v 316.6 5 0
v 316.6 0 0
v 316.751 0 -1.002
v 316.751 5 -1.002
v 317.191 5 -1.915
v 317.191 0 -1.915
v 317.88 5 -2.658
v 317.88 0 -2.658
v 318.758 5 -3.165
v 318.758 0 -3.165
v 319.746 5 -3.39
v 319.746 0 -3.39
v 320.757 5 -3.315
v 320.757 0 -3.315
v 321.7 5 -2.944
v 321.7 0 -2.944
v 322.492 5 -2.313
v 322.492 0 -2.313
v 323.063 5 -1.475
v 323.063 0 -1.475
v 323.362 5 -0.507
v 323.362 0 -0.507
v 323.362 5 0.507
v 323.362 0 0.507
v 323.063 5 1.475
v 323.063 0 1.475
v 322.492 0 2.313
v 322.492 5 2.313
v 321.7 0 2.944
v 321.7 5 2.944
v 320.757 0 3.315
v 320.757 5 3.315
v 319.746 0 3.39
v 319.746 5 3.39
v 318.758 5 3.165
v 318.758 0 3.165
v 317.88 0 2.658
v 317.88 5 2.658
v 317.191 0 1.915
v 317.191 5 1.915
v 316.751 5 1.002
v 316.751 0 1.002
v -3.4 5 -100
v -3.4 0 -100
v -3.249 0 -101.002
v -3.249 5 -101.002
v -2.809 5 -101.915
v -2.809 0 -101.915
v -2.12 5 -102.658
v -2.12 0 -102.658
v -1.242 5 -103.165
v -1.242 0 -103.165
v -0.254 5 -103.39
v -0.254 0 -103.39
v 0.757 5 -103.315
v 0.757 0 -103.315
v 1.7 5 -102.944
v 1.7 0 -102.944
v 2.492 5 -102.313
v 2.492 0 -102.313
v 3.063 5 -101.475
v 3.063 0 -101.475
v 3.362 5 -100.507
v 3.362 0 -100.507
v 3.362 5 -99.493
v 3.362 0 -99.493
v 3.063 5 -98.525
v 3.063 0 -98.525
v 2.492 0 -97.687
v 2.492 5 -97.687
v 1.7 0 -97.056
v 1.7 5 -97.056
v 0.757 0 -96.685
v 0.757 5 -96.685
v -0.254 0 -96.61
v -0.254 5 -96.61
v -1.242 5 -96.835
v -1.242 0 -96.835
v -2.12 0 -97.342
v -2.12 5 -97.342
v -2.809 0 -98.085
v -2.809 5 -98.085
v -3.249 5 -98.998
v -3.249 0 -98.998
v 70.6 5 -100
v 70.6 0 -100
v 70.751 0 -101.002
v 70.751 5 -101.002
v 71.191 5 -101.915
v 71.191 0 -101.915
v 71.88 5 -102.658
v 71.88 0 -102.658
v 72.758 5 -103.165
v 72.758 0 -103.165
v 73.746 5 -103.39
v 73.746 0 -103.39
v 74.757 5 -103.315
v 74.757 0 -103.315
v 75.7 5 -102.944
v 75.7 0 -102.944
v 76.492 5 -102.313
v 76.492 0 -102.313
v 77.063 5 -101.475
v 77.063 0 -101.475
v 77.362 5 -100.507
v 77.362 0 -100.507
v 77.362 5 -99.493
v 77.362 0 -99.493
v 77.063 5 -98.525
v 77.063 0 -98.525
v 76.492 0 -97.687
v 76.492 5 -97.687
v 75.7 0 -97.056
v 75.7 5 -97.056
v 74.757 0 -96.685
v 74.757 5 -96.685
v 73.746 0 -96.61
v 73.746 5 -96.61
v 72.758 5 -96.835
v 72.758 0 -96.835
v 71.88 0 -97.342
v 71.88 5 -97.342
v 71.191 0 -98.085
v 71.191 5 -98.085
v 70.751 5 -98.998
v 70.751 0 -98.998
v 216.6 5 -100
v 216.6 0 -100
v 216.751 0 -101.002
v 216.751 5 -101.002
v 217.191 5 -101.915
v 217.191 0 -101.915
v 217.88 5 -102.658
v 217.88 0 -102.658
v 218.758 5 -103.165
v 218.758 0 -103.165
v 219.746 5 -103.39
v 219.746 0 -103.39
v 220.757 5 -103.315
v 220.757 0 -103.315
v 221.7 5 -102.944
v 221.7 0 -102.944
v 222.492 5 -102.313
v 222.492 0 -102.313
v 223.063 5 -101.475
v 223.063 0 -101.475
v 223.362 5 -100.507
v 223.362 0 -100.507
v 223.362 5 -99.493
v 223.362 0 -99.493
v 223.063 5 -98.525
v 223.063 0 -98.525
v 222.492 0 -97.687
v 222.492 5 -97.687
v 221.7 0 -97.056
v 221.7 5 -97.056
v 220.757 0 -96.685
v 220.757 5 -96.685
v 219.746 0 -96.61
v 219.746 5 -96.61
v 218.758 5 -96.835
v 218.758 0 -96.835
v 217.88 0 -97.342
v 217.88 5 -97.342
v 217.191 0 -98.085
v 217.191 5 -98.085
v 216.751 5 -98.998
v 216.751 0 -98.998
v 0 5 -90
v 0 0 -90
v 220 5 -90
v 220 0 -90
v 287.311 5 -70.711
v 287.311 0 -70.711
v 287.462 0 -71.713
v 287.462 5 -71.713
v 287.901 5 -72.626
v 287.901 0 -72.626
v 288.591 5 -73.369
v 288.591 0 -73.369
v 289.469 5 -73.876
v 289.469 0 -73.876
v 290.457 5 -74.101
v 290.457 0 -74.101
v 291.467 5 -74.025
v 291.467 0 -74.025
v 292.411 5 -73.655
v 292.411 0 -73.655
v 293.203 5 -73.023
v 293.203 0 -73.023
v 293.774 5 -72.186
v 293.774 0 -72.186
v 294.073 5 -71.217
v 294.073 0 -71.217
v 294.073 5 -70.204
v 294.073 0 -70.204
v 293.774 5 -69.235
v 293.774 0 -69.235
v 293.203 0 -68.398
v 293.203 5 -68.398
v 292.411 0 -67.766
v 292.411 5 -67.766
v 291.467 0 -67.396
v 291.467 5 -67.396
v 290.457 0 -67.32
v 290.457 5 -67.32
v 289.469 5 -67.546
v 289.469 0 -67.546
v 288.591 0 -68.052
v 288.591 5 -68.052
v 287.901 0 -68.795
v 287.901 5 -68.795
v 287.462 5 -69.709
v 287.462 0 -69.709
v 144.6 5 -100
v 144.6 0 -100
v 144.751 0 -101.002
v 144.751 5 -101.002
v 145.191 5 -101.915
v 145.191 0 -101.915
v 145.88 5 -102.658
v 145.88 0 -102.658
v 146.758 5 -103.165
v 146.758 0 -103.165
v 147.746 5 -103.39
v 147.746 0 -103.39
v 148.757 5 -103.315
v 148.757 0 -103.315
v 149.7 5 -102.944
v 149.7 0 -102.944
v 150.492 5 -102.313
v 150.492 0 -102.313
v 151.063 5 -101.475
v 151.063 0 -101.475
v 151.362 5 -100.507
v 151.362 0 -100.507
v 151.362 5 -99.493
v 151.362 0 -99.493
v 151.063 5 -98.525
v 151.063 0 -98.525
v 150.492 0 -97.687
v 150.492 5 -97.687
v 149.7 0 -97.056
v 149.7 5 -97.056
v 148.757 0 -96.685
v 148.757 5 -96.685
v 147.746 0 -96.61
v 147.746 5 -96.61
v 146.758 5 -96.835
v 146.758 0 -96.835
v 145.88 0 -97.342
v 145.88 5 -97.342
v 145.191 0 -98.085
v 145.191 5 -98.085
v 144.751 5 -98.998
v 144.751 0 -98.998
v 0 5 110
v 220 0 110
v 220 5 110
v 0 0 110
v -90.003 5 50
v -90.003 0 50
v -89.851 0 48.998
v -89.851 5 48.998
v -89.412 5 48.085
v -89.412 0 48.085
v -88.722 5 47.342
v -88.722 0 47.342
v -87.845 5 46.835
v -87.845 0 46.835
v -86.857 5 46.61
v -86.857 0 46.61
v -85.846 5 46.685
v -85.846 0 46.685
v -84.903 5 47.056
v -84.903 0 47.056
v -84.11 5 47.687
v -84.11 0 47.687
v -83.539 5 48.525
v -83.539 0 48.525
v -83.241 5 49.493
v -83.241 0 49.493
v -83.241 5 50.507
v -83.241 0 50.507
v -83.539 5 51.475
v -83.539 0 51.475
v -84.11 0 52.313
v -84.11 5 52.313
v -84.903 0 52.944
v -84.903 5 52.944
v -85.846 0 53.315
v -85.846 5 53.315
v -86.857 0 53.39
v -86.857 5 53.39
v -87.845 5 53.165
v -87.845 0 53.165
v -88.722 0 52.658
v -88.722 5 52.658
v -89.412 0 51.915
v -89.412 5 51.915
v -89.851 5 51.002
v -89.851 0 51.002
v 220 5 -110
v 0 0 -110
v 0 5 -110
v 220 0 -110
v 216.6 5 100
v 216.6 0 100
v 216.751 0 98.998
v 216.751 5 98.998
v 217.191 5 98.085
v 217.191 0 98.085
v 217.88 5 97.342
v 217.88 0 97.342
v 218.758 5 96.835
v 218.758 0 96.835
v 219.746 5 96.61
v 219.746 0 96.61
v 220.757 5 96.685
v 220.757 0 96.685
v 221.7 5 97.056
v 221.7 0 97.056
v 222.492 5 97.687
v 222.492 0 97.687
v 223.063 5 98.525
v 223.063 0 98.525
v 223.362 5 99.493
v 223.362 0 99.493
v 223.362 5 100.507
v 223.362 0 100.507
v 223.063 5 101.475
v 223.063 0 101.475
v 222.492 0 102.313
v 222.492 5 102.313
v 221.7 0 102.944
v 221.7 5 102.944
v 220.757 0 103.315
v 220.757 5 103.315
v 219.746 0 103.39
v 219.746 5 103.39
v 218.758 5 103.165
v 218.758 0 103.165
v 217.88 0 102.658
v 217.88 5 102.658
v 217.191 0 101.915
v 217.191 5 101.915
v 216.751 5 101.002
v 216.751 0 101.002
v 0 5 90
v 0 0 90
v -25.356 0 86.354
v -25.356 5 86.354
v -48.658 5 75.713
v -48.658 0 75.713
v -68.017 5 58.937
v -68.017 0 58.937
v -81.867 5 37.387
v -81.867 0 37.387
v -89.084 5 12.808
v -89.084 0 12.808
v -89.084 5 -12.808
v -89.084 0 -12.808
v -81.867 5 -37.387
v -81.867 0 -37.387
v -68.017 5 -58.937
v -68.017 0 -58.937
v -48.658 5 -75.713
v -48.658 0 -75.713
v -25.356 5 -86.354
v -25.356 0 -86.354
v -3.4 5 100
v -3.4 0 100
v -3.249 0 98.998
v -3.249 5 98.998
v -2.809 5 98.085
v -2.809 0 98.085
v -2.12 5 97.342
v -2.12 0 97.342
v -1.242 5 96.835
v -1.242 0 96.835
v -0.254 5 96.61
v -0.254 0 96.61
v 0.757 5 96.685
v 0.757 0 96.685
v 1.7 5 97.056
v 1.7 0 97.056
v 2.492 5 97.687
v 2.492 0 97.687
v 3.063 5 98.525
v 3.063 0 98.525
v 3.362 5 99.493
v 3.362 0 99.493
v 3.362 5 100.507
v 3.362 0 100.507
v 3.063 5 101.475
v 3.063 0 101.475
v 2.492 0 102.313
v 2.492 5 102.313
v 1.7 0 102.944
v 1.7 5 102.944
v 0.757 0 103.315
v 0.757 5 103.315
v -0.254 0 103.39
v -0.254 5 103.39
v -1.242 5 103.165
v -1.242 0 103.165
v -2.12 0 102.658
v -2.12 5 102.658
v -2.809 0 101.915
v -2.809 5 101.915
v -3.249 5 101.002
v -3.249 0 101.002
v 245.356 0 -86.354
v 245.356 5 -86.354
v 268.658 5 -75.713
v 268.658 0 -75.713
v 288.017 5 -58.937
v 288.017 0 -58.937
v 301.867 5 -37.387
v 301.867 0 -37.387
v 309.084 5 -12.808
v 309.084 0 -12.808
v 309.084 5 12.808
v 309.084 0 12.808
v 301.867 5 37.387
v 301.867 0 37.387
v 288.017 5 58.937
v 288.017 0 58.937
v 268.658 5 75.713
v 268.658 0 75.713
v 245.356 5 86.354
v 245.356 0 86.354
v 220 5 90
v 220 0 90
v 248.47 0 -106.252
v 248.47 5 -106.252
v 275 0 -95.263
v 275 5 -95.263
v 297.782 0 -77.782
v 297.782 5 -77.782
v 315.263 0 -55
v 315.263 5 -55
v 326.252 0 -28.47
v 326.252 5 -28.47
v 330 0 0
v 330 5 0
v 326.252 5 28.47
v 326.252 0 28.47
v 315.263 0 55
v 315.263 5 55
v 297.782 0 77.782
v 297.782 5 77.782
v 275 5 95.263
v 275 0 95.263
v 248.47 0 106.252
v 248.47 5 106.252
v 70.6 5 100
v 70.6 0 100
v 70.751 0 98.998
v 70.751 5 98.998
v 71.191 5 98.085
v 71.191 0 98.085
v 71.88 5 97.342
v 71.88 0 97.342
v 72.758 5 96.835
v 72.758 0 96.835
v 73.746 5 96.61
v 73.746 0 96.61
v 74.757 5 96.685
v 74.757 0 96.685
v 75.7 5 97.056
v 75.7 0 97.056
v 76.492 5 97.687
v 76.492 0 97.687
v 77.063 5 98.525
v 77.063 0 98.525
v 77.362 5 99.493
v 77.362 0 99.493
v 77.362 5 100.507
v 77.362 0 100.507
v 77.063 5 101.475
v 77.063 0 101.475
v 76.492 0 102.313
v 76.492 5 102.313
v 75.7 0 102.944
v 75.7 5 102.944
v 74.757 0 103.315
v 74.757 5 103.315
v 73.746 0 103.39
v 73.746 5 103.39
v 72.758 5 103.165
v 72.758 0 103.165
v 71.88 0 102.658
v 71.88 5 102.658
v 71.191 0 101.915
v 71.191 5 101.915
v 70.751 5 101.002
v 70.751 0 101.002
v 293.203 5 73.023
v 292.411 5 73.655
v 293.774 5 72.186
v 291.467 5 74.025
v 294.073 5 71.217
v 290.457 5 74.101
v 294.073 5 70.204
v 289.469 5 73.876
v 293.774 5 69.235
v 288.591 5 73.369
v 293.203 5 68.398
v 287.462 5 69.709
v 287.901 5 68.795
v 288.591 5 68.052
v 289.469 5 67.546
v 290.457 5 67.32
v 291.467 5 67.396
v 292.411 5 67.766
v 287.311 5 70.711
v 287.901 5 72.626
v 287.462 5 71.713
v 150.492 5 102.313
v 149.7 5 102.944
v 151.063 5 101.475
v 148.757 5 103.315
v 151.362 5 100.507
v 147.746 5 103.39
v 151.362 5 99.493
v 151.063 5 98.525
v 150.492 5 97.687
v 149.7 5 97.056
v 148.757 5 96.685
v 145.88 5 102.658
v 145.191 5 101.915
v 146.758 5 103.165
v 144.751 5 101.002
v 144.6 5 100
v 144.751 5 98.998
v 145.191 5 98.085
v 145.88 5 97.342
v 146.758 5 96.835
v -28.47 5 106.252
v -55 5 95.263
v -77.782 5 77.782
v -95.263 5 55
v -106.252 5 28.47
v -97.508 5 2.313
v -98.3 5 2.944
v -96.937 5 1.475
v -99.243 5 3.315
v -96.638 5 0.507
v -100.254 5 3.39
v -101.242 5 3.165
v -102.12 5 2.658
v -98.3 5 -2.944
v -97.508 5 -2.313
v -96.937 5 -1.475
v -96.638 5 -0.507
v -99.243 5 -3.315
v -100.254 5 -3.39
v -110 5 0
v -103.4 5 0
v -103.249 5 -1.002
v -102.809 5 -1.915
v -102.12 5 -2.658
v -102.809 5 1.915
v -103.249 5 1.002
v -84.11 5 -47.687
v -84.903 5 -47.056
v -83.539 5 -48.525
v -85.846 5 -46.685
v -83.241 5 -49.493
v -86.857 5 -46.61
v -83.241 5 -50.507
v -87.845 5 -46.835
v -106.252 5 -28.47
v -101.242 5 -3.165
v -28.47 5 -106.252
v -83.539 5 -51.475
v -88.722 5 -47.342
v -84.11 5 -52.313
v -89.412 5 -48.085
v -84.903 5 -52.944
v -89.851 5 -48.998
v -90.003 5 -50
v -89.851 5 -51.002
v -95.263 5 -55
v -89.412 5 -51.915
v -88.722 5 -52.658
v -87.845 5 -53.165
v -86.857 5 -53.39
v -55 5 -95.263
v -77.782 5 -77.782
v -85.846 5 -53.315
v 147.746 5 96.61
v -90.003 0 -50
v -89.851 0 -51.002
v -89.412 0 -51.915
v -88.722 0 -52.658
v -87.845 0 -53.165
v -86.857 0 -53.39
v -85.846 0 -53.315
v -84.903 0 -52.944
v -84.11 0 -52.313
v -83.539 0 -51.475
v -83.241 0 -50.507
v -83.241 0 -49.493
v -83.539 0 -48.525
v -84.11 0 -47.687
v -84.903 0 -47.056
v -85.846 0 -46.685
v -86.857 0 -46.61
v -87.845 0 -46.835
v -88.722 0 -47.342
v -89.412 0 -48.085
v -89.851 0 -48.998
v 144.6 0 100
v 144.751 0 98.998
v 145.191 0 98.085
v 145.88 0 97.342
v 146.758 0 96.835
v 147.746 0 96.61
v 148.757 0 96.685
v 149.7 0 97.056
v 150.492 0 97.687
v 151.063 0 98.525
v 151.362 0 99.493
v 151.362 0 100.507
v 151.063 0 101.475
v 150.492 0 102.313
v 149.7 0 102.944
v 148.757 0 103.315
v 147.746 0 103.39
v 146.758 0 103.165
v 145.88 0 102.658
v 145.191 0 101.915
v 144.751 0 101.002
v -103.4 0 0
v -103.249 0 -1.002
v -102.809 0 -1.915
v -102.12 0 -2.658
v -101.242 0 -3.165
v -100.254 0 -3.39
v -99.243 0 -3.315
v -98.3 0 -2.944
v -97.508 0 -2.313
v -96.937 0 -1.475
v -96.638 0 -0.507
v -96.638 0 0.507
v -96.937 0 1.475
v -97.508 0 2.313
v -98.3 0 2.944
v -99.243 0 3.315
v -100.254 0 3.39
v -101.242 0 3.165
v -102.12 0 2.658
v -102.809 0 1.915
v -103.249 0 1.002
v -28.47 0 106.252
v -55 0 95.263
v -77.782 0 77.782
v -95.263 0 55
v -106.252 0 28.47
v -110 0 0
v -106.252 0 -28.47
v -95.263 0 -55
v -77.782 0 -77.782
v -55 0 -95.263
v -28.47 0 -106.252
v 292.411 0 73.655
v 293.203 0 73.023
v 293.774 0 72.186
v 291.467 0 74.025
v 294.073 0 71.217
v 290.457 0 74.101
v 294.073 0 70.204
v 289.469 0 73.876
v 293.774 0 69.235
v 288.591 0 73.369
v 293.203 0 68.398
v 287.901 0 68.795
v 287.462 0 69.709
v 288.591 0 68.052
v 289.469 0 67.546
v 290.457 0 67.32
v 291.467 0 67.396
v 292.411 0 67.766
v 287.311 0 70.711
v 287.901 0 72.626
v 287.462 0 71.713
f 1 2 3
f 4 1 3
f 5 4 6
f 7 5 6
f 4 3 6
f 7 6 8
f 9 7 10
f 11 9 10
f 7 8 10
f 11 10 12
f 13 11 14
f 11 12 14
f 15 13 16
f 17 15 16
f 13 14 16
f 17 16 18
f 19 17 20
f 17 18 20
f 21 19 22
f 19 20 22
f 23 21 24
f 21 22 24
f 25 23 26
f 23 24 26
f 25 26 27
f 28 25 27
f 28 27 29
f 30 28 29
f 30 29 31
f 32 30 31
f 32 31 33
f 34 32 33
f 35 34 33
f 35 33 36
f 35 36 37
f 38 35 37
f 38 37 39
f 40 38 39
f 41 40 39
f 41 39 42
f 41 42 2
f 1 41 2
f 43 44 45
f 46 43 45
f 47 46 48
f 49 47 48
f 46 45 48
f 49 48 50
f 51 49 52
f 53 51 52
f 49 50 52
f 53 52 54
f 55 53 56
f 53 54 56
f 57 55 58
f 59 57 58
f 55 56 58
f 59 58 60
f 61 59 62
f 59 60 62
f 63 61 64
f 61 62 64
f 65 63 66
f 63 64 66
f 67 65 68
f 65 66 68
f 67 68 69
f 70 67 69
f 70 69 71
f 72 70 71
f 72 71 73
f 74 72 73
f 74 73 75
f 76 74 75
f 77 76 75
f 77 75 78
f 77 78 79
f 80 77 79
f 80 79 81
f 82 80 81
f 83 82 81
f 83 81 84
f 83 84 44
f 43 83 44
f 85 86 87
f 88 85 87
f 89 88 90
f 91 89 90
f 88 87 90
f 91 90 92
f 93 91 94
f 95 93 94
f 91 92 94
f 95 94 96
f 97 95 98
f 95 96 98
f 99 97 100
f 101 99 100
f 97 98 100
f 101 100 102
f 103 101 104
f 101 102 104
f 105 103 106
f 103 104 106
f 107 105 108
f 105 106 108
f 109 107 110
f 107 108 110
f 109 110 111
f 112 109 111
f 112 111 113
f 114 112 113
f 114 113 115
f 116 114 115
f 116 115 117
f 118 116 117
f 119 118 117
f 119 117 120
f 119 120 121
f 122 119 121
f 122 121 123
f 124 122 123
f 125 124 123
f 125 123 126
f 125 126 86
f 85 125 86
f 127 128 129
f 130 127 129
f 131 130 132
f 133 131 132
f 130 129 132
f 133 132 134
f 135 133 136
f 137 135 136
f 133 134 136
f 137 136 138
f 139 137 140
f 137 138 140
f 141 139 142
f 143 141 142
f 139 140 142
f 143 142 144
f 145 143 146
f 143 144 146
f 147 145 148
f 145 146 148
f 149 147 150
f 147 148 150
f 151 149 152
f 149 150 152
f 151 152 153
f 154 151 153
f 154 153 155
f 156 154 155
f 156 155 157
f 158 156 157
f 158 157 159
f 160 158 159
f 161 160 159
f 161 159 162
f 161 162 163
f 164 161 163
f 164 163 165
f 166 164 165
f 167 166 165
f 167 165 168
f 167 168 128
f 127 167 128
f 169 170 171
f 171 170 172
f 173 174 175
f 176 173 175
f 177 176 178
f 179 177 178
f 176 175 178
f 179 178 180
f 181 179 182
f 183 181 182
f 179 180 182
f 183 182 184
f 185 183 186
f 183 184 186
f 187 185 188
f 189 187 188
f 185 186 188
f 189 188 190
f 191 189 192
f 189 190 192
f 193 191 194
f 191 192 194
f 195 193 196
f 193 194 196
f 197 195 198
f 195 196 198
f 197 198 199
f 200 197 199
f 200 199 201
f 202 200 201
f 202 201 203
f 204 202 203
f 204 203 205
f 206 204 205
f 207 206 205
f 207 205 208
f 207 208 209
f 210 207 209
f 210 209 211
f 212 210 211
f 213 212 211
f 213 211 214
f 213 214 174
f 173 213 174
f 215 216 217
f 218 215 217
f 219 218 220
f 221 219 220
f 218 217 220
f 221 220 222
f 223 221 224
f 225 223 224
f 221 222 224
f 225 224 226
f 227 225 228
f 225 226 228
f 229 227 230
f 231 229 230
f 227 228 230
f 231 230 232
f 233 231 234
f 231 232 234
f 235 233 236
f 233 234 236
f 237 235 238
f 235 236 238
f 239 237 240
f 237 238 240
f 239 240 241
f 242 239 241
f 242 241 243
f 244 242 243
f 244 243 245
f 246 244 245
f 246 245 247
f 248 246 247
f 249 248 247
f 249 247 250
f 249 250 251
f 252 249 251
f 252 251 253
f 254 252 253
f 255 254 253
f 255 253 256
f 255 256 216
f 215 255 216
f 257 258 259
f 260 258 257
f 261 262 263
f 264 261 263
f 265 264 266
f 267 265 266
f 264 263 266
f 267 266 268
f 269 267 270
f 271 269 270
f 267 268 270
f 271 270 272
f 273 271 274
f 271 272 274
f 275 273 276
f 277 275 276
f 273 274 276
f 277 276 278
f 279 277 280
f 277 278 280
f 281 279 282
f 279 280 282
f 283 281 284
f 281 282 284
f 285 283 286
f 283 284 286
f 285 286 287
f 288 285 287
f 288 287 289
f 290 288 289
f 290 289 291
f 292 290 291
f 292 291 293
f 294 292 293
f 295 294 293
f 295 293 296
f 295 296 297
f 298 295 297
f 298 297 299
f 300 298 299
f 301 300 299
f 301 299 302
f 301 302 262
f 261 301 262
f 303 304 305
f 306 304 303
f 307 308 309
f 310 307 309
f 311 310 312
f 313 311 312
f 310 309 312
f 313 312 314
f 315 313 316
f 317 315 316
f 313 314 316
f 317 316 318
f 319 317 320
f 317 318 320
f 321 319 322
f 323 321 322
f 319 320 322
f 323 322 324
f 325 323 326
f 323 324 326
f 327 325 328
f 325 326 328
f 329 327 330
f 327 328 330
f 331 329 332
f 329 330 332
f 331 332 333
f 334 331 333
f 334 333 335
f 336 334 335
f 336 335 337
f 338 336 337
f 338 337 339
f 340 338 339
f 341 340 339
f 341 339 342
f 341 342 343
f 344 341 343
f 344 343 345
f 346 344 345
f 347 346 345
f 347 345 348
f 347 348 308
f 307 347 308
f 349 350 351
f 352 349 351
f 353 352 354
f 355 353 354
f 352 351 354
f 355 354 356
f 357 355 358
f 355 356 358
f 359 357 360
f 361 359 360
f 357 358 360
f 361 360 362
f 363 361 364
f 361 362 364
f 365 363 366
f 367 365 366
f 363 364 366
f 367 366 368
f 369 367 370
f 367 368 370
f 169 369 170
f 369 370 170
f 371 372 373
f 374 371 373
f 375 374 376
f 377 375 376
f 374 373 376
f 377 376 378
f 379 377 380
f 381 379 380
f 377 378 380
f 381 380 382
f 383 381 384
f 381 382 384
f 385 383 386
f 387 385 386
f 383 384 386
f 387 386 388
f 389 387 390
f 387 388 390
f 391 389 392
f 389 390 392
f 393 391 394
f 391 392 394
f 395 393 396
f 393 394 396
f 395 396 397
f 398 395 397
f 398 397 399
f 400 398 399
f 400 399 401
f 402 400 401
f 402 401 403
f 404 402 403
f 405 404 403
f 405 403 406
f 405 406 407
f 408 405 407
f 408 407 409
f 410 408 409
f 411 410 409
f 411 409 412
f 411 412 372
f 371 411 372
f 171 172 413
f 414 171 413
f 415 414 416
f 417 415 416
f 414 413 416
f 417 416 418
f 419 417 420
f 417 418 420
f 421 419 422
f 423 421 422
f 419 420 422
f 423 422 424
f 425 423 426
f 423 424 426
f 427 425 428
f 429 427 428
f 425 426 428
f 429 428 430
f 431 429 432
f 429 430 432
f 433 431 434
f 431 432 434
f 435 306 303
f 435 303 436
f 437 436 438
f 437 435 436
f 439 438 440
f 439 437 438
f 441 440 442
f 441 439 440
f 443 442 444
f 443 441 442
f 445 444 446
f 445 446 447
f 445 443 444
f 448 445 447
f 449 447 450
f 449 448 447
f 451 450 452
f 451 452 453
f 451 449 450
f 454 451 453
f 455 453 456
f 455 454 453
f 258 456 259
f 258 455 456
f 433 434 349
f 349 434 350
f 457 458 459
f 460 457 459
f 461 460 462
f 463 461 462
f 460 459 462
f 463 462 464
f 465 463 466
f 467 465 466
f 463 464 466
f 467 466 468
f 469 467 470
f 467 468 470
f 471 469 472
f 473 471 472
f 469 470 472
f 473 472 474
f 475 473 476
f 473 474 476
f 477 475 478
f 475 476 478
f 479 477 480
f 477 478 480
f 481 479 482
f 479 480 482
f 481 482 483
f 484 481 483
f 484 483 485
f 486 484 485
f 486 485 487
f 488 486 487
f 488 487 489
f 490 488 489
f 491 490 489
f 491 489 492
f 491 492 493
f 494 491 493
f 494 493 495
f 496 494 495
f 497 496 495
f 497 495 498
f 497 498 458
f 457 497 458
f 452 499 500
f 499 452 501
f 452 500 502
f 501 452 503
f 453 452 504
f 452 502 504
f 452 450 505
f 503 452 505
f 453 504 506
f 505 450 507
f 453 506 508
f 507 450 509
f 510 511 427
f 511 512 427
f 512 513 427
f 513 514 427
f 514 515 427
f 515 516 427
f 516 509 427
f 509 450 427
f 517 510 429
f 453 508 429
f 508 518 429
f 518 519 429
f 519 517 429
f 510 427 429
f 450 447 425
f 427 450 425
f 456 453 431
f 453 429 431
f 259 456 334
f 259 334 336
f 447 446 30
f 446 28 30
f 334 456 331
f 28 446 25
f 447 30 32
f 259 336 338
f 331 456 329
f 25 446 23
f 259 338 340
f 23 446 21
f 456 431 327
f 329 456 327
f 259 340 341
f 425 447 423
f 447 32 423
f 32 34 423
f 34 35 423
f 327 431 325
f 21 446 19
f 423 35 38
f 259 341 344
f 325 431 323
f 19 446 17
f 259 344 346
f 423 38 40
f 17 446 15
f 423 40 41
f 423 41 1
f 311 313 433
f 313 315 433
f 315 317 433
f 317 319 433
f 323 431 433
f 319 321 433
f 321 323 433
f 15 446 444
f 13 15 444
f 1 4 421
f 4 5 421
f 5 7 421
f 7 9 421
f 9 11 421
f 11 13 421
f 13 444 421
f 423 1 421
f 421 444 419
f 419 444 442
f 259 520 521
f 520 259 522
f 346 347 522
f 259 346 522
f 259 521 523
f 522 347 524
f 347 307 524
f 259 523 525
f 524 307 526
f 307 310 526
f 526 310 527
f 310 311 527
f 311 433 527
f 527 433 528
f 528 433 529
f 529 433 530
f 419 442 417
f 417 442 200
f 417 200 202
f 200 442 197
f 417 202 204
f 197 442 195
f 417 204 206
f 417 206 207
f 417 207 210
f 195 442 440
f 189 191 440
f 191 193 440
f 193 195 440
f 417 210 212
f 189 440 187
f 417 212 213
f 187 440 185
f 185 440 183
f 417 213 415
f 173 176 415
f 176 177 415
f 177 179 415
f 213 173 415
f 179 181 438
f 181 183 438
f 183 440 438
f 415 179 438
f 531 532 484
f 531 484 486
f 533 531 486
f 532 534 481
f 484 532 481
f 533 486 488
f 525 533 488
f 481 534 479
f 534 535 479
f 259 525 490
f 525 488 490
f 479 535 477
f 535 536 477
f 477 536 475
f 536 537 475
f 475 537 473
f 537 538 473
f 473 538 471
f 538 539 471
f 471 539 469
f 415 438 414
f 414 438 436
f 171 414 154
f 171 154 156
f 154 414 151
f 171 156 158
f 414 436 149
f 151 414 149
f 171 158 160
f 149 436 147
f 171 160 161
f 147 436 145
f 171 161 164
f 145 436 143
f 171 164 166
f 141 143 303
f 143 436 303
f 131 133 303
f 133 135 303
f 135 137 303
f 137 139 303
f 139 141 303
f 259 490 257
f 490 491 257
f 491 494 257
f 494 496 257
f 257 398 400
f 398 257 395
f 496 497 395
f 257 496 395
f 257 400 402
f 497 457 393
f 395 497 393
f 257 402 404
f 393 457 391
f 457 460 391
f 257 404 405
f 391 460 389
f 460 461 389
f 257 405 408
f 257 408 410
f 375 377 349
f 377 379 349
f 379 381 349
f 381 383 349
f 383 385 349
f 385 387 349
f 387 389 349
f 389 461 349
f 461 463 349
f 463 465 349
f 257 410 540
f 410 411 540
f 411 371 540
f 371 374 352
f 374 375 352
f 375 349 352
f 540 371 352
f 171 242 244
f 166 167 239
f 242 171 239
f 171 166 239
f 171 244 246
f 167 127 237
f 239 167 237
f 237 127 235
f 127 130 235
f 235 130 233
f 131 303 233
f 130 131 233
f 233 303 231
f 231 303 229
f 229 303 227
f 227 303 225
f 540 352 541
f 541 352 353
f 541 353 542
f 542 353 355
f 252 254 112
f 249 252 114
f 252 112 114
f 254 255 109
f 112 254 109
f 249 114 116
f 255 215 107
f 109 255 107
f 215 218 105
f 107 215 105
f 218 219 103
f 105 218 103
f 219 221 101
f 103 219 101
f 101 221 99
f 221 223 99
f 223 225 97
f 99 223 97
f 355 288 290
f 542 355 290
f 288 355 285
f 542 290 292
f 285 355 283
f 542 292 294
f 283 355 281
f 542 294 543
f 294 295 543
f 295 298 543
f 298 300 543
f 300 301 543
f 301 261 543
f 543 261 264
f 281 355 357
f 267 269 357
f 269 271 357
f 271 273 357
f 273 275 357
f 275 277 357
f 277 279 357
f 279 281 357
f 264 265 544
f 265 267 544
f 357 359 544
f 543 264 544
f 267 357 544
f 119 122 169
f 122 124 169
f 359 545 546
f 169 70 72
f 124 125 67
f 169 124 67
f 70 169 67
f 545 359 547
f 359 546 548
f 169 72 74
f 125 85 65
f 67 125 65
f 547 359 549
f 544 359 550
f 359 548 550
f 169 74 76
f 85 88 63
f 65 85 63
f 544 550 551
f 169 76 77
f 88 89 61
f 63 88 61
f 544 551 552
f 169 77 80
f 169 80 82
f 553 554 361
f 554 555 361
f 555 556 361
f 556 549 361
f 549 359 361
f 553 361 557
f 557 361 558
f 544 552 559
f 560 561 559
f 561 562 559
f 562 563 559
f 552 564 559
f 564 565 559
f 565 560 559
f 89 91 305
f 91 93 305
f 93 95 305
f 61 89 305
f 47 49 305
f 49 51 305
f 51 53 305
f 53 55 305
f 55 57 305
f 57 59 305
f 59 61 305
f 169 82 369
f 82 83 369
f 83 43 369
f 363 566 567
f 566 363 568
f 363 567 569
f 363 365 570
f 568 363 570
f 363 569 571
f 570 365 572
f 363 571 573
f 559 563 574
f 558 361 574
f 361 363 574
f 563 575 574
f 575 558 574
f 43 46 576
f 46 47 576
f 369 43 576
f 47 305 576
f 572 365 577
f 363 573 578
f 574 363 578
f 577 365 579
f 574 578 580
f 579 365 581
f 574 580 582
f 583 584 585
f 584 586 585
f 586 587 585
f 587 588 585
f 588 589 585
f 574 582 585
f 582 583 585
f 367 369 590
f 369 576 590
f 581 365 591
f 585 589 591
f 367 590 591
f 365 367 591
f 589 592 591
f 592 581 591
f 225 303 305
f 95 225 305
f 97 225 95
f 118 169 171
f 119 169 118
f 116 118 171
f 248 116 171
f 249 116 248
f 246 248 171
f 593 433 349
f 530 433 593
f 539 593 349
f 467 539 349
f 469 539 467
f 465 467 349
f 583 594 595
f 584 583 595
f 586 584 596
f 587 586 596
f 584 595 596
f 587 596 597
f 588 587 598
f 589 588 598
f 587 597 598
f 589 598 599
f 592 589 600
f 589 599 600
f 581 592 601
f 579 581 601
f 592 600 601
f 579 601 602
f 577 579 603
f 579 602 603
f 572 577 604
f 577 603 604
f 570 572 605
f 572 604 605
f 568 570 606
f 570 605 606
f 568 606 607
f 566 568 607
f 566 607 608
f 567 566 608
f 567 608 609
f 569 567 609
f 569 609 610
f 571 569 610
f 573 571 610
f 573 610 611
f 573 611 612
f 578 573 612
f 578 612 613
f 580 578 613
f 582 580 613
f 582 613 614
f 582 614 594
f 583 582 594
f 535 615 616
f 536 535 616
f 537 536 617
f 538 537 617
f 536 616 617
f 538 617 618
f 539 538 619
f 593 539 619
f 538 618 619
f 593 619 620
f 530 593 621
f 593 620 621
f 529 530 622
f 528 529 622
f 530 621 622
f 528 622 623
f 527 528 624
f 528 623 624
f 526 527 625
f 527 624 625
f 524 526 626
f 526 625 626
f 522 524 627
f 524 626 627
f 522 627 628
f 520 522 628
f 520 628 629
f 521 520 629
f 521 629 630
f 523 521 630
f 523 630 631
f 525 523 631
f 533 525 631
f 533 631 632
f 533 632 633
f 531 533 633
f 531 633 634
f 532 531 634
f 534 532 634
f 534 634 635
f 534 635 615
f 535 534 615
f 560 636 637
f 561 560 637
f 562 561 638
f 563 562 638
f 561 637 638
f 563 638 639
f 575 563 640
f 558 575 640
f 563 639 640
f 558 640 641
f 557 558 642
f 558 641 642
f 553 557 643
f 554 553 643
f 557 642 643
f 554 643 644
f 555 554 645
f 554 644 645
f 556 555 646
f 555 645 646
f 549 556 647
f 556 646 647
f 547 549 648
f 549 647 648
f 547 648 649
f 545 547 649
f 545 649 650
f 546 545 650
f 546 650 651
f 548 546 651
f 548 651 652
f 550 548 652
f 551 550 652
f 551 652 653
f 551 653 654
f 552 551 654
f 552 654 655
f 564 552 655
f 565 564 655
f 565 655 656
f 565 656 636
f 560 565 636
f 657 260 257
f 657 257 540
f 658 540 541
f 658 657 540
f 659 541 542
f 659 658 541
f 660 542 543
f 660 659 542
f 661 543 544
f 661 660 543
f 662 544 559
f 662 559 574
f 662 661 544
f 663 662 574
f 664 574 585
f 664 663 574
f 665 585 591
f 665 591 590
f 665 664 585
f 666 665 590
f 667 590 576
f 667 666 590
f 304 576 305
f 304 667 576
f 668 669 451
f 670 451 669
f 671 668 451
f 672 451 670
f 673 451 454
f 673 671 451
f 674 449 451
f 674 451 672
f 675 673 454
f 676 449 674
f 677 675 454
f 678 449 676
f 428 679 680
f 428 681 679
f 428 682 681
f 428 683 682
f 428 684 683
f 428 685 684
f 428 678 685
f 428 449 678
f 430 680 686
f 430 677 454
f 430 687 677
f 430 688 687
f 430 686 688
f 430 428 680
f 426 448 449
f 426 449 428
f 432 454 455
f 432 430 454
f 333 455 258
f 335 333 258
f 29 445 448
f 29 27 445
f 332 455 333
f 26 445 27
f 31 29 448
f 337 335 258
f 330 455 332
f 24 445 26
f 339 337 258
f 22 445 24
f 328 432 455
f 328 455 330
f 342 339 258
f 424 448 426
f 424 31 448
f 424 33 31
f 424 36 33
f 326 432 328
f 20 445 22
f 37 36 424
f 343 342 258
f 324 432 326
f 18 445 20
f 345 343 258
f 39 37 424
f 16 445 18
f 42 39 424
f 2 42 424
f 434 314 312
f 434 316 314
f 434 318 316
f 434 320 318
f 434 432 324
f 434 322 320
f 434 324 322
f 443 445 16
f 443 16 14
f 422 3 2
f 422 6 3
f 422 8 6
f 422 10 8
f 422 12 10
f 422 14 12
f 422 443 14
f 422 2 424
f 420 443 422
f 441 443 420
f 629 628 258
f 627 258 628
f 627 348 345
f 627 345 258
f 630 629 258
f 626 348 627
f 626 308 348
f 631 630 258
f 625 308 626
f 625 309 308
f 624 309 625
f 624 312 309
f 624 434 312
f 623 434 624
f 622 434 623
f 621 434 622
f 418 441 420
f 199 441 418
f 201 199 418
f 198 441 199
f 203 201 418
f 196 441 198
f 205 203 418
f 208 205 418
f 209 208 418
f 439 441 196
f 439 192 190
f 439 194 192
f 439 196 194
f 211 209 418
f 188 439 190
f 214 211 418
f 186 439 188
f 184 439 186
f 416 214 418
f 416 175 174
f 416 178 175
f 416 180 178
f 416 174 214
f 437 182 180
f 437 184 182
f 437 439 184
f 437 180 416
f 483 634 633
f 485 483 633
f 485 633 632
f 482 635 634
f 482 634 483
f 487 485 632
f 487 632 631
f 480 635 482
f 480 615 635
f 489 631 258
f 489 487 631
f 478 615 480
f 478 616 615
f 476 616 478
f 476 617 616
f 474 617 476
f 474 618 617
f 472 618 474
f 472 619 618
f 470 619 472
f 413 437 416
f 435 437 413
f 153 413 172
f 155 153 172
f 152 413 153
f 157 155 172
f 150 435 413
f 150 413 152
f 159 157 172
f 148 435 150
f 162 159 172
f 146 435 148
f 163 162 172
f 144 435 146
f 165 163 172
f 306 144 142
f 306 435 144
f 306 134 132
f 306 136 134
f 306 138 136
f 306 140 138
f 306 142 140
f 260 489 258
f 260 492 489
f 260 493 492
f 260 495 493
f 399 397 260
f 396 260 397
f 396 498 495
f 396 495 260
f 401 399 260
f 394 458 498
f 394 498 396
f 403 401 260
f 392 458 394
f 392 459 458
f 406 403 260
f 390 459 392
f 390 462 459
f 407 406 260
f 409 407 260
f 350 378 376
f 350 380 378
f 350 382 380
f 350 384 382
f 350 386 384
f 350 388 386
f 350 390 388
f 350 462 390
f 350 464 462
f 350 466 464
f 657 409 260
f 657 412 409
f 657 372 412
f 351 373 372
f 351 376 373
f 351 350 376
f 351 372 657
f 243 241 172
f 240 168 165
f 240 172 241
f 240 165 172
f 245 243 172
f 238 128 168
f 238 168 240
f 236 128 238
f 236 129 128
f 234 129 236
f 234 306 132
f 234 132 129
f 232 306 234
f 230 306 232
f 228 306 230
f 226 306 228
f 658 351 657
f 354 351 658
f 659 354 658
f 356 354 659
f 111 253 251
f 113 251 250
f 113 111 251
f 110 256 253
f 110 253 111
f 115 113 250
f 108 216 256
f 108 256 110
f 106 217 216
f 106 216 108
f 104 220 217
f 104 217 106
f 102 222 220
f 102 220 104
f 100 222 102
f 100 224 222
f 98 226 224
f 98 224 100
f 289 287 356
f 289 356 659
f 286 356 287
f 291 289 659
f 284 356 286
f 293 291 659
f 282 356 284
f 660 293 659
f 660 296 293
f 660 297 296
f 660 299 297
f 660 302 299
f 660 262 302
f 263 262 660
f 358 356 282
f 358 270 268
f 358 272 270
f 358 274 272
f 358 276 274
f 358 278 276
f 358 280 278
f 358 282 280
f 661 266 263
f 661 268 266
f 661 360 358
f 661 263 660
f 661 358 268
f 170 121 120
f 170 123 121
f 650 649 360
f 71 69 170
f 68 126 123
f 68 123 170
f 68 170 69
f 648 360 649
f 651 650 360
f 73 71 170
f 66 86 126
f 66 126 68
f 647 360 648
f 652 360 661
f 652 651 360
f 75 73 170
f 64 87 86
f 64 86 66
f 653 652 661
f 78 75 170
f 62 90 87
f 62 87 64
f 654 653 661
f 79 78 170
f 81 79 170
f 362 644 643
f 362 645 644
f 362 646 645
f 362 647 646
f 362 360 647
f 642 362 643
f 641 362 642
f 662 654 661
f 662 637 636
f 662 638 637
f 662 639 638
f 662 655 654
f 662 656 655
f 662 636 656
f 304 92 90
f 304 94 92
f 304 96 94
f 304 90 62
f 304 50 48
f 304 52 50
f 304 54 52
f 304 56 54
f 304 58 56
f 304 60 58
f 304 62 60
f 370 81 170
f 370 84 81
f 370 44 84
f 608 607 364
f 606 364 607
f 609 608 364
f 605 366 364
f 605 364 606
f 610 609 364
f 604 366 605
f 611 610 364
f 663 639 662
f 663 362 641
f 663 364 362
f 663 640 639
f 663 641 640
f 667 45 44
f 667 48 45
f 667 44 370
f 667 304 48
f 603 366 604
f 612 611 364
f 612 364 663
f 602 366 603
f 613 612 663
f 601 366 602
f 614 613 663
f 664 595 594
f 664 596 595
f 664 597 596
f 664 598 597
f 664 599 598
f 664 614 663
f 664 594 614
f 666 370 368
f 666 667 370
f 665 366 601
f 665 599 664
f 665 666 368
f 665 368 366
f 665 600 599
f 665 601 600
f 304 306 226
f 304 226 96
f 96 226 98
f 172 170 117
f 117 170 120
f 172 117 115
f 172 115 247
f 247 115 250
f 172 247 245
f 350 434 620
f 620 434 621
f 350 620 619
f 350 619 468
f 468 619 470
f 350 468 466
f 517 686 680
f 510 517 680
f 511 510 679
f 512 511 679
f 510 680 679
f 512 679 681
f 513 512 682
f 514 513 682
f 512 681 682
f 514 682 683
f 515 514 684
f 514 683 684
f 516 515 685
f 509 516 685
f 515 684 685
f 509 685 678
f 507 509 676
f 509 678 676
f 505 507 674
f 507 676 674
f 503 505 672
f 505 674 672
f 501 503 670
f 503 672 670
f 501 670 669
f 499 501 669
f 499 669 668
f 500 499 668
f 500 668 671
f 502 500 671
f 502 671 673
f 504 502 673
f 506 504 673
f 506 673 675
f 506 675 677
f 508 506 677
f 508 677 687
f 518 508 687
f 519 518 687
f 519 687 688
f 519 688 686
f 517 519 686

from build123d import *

# Parameters (mm, degrees)
BOSS_EXTRUDE1_DEPTH          = 5
TAP_DRILL_FOR_M8X1_25_TAP1_D = 6.8


with BuildPart() as part:
    # Sketch1 → Boss-Extrude1 (new body)
    with BuildSketch(Plane(origin=(0, 0, 0), x_dir=(1, 0, 0), z_dir=(0, 1, 0))):
        with BuildLine():
            Line((0, 110), (220, 110))
            ThreePointArc((220, 110), (330, 0), (220, -110))
            Line((220, -110), (0, -110))
            ThreePointArc((0, -110), (-110, 0), (0, 110))
        make_face()
        with BuildLine():
            Line((0, 90), (220, 90))
            ThreePointArc((220, 90), (310, 0), (220, -90))
            Line((220, -90), (0, -90))
            ThreePointArc((0, -90), (-90, 0), (0, 90))
        make_face(mode=Mode.SUBTRACT)
    extrude(amount=BOSS_EXTRUDE1_DEPTH)

    # Tap Drill for M8x1.25 Tap1 (through all)
    with Locations(Plane(origin=(0, 5, 0), x_dir=(1, 0, 0), z_dir=(0, 1, 0))):
        with Locations((-86.602540378, -50), (0, -100), (220, 100), (-100, 0), (-86.602540378, 50), (0, 100), (74, 100), (148, 100), (290.710678119, 70.710678119), (320, 0), (290.710678119, -70.710678119), (220, -100), (148, -100), (74, -100)):
            Hole(TAP_DRILL_FOR_M8X1_25_TAP1_D / 2)


solid = part.part
